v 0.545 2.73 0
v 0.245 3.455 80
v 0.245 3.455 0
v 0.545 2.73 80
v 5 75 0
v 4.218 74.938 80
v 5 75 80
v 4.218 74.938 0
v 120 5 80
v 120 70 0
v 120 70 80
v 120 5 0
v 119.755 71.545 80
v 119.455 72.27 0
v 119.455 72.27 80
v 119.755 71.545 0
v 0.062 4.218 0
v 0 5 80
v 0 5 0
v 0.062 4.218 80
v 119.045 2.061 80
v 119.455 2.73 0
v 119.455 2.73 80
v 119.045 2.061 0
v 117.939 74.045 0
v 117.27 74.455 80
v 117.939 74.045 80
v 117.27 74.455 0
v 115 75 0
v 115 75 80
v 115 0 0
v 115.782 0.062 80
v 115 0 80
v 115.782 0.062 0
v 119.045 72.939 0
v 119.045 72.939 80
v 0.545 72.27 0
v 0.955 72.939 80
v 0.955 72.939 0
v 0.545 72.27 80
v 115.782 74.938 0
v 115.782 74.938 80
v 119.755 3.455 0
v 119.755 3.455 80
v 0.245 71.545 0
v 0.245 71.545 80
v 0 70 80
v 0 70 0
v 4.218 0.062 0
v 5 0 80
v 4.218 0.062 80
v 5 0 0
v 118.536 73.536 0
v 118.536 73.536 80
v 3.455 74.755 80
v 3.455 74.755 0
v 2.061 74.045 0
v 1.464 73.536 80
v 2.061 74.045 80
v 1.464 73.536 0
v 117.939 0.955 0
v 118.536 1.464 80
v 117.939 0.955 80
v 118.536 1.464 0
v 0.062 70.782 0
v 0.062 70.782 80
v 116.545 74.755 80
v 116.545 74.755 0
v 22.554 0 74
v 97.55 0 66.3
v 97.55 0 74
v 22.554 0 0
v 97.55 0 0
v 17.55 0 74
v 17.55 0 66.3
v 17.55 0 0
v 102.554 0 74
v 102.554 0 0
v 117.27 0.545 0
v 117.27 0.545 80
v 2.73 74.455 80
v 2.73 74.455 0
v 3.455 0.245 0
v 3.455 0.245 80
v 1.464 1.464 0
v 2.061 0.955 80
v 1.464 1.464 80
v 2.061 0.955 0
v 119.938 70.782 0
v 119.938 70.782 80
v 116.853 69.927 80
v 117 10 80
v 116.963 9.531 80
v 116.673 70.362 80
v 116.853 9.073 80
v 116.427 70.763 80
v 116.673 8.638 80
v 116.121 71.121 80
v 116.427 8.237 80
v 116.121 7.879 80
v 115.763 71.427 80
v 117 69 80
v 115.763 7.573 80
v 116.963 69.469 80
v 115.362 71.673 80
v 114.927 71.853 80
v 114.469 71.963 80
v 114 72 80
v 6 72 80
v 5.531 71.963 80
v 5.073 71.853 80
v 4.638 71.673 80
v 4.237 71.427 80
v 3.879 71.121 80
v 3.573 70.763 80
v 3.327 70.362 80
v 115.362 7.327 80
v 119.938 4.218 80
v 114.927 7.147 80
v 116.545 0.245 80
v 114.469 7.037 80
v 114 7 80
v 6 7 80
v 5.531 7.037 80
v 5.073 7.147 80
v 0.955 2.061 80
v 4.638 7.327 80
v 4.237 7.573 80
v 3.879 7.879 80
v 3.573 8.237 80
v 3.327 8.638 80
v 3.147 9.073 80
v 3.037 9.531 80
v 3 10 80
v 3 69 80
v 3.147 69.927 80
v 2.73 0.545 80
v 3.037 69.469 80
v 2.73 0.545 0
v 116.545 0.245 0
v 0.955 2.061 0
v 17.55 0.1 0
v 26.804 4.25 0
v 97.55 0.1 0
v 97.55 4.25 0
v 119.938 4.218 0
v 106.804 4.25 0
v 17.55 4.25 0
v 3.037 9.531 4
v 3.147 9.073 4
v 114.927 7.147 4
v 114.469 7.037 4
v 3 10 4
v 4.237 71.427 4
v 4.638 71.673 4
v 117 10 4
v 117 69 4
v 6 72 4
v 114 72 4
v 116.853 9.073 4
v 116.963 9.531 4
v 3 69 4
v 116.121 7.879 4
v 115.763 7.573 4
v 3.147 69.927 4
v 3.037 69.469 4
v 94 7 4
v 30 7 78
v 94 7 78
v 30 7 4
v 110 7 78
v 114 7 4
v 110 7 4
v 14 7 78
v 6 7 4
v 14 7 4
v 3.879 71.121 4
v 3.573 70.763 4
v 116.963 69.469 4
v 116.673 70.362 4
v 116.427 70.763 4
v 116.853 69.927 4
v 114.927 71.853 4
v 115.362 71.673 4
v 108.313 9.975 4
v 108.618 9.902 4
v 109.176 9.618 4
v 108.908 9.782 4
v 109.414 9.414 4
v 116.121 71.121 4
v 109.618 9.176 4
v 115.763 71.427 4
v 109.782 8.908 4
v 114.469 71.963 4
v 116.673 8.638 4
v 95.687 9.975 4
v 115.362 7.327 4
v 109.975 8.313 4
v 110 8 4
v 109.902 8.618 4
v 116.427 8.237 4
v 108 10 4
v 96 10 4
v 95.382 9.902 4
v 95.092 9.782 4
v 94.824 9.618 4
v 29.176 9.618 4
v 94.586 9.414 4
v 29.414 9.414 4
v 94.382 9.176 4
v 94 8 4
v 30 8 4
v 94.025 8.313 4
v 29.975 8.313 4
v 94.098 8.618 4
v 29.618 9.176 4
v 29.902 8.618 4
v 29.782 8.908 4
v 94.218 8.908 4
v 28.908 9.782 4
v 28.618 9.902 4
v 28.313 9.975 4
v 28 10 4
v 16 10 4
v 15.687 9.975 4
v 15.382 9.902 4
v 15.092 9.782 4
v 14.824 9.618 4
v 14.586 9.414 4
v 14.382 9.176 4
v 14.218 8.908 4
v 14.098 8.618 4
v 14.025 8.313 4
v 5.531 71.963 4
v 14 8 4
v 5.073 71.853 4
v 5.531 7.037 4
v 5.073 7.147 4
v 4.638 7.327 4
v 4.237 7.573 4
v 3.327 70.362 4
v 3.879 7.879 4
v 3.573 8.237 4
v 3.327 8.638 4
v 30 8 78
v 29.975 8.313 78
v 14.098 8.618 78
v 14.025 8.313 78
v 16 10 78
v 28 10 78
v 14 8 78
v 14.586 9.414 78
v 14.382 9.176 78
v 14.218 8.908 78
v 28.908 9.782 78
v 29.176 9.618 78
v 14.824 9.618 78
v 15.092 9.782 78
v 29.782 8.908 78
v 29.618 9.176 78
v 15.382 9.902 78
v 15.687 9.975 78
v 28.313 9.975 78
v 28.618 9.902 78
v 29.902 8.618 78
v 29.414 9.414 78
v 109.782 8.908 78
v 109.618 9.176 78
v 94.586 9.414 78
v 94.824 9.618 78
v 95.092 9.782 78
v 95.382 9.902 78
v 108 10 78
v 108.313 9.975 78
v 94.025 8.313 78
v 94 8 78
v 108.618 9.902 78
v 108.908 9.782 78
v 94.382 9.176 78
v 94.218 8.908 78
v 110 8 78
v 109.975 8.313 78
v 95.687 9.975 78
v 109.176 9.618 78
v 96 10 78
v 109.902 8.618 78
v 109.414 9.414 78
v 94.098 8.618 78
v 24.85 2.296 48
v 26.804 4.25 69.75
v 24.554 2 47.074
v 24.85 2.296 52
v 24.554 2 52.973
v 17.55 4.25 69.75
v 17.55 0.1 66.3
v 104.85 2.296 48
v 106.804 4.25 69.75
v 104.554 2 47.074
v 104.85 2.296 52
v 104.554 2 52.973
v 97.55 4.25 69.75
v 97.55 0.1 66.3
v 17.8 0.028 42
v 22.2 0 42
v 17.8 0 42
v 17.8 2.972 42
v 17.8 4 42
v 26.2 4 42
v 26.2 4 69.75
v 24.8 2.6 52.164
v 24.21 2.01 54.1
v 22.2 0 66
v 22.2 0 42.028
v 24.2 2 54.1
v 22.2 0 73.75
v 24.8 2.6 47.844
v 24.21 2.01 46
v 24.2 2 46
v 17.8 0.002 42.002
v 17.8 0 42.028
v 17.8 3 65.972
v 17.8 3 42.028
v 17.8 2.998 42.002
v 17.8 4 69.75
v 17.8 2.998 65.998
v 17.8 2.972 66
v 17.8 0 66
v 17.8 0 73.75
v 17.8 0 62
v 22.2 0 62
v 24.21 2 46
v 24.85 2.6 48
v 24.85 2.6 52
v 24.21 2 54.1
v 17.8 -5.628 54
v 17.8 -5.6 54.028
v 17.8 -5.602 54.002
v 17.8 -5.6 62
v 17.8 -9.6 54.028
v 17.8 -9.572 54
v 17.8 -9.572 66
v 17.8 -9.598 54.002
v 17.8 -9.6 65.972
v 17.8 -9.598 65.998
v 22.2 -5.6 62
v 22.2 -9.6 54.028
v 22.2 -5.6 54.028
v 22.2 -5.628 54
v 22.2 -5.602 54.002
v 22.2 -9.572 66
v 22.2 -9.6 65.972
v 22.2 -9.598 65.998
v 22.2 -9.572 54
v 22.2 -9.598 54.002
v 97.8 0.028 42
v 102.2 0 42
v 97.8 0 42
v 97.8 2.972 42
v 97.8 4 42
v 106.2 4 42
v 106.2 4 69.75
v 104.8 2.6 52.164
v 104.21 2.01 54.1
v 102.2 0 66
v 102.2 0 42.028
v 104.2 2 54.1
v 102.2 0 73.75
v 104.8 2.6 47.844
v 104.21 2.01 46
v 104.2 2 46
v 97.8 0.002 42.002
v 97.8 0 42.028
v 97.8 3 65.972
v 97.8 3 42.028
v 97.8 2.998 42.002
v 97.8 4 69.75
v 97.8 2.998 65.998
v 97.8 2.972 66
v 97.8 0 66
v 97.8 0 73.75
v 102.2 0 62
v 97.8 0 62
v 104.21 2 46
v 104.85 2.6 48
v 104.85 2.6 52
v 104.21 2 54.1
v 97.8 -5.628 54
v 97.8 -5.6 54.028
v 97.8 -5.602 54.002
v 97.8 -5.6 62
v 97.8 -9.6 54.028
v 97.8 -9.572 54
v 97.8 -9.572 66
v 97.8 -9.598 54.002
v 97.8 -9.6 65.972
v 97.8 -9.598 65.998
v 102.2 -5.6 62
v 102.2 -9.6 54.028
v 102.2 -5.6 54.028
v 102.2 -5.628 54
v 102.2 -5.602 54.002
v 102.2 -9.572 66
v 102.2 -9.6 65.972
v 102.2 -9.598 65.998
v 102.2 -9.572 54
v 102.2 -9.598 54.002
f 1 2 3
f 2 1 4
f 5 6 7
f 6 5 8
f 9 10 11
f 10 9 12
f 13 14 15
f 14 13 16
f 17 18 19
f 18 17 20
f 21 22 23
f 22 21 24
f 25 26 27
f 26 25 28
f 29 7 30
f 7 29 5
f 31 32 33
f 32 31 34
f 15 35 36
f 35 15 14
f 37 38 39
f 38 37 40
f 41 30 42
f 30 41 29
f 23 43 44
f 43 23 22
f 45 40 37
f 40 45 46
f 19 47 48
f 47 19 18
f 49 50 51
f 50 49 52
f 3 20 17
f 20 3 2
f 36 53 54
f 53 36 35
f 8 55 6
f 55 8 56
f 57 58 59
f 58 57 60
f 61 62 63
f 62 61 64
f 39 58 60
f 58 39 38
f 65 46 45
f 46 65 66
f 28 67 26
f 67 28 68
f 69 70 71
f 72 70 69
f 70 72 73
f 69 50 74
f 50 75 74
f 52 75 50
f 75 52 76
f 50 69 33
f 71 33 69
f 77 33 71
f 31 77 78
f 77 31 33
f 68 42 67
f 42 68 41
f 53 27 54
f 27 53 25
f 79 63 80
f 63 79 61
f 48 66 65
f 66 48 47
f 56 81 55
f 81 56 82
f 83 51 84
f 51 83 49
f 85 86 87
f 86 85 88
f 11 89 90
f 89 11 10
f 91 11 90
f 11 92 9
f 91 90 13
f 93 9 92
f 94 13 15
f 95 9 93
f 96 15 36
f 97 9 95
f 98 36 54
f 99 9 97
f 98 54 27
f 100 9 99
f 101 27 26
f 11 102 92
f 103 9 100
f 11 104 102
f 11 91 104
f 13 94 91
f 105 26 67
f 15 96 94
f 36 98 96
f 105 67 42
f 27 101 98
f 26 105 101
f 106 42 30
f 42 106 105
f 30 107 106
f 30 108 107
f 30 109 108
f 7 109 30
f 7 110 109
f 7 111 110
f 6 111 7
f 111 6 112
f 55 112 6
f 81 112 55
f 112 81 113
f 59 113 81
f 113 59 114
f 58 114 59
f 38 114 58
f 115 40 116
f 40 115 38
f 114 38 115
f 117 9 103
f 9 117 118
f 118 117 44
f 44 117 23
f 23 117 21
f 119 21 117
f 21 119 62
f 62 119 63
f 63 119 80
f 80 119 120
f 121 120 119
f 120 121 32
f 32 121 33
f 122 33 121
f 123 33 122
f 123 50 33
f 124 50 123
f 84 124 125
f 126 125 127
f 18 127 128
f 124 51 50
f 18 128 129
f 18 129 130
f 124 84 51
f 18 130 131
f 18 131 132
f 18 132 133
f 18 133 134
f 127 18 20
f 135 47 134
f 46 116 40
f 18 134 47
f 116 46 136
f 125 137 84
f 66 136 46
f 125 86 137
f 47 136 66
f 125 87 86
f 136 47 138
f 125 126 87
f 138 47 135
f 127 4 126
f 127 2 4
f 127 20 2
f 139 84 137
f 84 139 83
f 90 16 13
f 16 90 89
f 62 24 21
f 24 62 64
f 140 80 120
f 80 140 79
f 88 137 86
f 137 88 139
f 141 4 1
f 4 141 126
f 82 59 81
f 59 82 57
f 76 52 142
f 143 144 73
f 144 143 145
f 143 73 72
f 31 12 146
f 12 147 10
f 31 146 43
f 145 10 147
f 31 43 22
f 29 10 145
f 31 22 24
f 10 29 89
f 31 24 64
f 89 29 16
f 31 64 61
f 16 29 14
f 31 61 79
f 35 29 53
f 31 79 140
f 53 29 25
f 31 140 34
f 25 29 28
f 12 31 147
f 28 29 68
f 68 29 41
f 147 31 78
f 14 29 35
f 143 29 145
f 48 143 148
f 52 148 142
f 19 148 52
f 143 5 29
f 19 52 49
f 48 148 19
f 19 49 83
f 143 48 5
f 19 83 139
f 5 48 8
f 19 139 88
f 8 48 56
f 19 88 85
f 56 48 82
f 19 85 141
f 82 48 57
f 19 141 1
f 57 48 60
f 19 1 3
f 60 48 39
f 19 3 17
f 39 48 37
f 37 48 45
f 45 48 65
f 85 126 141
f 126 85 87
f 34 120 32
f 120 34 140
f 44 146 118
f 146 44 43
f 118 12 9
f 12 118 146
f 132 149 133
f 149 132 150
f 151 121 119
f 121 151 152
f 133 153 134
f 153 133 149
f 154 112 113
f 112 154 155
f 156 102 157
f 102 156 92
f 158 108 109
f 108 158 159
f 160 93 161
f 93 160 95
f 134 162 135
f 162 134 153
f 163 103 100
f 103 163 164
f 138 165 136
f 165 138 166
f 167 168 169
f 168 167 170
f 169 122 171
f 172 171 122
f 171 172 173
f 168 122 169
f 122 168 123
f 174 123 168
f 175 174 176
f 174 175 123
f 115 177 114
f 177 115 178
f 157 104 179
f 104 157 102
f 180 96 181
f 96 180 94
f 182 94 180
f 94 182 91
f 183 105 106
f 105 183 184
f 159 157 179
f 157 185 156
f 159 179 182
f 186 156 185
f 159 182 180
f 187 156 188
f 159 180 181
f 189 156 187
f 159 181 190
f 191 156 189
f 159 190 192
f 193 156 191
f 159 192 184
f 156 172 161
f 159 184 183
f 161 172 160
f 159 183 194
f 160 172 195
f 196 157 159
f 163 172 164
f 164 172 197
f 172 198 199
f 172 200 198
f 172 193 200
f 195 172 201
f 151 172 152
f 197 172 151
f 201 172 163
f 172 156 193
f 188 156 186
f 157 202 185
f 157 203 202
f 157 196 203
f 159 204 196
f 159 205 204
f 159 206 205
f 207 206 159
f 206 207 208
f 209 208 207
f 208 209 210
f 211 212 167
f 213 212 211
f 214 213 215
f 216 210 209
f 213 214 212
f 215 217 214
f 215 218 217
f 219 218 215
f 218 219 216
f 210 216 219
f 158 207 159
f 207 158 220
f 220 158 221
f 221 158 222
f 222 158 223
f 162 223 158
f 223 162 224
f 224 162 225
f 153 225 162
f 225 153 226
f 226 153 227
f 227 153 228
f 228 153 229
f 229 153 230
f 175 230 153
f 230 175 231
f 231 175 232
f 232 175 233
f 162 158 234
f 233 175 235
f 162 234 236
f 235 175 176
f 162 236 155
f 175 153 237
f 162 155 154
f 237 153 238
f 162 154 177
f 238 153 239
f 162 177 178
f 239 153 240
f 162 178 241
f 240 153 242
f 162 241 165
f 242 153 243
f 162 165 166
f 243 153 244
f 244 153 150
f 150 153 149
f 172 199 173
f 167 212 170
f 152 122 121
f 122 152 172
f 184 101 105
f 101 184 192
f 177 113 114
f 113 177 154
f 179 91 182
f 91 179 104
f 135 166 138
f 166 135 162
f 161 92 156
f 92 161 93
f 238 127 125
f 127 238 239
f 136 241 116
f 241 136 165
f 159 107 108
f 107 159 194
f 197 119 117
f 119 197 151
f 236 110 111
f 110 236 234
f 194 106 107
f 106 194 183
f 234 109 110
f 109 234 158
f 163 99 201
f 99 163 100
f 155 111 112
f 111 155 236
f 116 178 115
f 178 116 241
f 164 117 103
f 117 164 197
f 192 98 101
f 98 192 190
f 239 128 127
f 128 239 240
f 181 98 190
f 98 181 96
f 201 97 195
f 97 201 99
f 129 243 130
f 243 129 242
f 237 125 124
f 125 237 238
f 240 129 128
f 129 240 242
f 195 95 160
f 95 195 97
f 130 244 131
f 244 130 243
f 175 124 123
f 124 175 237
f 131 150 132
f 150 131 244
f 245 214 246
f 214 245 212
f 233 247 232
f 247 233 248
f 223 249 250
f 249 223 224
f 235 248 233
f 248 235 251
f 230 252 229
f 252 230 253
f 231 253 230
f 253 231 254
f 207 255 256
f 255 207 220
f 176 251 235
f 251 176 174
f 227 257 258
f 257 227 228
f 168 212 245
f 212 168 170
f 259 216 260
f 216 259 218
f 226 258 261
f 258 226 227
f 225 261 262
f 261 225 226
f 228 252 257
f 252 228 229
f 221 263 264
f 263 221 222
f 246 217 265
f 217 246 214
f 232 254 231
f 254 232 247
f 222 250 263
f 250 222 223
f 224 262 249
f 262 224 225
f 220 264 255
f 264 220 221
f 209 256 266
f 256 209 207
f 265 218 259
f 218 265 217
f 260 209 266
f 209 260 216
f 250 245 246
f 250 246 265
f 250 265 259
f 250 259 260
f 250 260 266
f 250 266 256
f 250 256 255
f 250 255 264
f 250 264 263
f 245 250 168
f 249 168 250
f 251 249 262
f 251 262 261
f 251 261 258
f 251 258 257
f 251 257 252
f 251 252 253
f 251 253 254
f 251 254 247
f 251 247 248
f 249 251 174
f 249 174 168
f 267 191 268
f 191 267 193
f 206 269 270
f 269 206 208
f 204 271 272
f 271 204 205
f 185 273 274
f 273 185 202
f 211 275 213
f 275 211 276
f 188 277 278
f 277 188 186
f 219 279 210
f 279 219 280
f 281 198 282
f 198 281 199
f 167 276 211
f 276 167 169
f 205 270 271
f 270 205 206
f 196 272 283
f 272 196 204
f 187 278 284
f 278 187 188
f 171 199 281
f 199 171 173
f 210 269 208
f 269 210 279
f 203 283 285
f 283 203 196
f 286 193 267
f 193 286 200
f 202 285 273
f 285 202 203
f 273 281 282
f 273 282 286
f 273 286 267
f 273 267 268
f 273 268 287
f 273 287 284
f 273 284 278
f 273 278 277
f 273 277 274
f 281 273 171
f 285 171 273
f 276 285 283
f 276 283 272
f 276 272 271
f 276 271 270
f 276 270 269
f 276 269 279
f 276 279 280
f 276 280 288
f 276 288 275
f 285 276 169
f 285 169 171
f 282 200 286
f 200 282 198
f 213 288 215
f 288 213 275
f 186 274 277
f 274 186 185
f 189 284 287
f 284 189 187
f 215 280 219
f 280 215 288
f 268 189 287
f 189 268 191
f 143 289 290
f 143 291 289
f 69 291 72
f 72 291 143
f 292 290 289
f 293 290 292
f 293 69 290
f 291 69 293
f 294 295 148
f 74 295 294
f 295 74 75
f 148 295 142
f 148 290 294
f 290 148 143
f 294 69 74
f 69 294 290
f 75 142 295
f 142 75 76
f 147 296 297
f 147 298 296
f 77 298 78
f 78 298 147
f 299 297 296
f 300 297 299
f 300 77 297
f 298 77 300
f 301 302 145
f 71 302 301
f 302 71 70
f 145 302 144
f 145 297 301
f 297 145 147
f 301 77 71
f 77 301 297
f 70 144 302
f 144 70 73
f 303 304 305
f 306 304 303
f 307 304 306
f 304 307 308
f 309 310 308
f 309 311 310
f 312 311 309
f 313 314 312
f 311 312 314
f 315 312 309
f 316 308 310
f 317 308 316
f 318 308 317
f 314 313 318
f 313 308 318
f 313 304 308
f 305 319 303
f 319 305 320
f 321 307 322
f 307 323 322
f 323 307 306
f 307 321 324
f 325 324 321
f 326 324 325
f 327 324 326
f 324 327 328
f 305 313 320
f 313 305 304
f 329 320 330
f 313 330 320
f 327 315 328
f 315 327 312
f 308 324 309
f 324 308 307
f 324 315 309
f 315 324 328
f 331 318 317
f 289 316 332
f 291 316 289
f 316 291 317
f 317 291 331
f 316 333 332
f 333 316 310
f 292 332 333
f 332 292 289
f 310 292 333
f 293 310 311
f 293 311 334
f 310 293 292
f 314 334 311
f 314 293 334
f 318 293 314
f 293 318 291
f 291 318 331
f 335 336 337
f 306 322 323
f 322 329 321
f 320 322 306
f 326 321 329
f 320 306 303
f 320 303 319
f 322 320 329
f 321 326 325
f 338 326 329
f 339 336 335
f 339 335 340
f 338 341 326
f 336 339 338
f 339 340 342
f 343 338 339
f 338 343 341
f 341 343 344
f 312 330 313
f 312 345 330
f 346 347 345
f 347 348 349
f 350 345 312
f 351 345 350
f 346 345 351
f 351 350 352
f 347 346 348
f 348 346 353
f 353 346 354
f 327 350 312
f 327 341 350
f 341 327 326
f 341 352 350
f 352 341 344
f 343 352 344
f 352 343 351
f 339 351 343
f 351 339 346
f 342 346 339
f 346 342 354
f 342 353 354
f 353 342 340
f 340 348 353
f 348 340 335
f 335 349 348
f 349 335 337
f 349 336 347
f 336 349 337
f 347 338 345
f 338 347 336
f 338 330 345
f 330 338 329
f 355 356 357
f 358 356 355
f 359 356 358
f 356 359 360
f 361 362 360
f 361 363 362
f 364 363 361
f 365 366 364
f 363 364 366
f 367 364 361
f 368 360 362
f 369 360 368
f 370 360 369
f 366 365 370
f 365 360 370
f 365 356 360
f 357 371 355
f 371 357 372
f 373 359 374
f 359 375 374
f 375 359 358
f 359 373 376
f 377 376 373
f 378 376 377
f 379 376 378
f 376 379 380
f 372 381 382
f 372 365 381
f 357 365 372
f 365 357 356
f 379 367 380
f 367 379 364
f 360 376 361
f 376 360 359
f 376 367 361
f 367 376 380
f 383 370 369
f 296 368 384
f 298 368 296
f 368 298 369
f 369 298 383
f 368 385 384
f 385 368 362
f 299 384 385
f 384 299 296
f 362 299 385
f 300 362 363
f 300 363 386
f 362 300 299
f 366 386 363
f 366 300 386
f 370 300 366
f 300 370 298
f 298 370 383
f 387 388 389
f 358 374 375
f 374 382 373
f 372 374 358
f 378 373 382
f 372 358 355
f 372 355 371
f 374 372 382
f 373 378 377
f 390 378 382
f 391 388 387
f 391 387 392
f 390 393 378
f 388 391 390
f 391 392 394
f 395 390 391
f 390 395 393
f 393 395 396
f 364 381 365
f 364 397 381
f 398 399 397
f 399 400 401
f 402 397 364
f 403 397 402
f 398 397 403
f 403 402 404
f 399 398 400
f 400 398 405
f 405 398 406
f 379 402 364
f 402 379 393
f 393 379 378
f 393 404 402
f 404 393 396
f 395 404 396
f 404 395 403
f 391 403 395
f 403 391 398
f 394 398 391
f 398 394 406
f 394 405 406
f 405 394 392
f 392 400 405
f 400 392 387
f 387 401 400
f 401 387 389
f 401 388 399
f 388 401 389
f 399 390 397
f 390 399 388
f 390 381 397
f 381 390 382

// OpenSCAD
// SKADIS: bottom-insert, asymmetric dovetail; sloped closed top bears load.
// part 0 assembly, 1 box upright, 2 hook on its flat side. Millimetres.
/* [Output] */
part = 0; // [0:Assembly,1:Box,2:Hook for printing]
/* [Box dimensions in mm] */
width = 120; // [60:1:300]
depth = 75; // [30:1:200]
height = 80; // [50:1:250]
wall = 3; // [2:0.2:6]
floor_thickness = 4; // [2:0.2:8]
back_thickness = 7; // [7:0.5:12]
corner_radius = 5; // [3:0.5:12]
/* [Mount placement] */
hook_count = 2; // [2:1:5]
// Distance between adjacent hooks = this value times the 40 mm board grid.
hook_spacing_steps = 2; // [1:1:6]
// Distance from box rim to hook neck top.
mount_top_offset = 14; // [14:1:30]
/* [Fit] */
fit = 0.25; // [0.15:0.05:0.4]
// Small friction ridge, not a positive latch.
friction_ridge_enabled = true;
/* [Hidden] */
hook_width=4.4;
board_pitch=40;
hook_spacing=board_pitch*hook_spacing_steps;
hook_span=(hook_count-1)*hook_spacing;
mount_shift=height-mount_top_offset-66;
rib_height=height-mount_top_offset+12;
$fn=40;
assert(width >= hook_span+32, "Box too narrow: reduce hook spacing/count or increase width.");
assert(height >= mount_top_offset+36, "Box too short for hook and upper stop.");
assert(wall >= 2 && floor_thickness >= 2 && back_thickness >= 7, "Walls/floor below minimum.");
assert(depth >= back_thickness+wall+12, "Box too shallow.");
assert(corner_radius >= wall && 2*corner_radius < min(width,depth), "Invalid corner radius.");
assert(fit >= 0.15 && fit <= 0.4, "Fit must be between 0.15 and 0.4 mm.");
assert(hook_count >= 2 && hook_count == floor(hook_count), "Use at least two hooks.");
assert(hook_spacing_steps >= 1 && hook_spacing_steps == floor(hook_spacing_steps), "Spacing must follow board grid.");
module rr(w,d,r) { hull() for(x=[r,w-r]) for(y=[r,d-r]) translate([x,y]) circle(r=r); }
// Cross section has a flat left side, permitting hook printing on that side.
module male_section() { polygon([[-2.2,0],[2.2,0],[6.2,4],[-2.2,4]]); }
module female_section() { offset(delta=fit) male_section(); }
// Wedge under z=74-y. Roof closes from inner wall outward at 45 degrees.
module under_roof() {
 translate([-20,0,0]) rotate([90,0,90]) linear_extrude(40)
  polygon([[-3,-2],[8,-2],[8,66+mount_shift],[-3,77+mount_shift]]);
}
module channel() {
 intersection() {
  translate([0,0,-1]) linear_extrude(height+1) female_section();
  under_roof();
 }
 // Open throat for the neck, also open at bottom of the rail.
 translate([-2.2-fit,-3,-1]) cube([4.4+2*fit,3.1,67.3+mount_shift]);
}
module body() {
 difference() {
  union() {
   difference() {
    linear_extrude(height) rr(width,depth,corner_radius);
    translate([wall,back_thickness,floor_thickness]) linear_extrude(height) rr(width-2*wall,depth-back_thickness-wall,max(1,corner_radius-wall+1));
   }
   // Internal ribs start at floor: no floating socket undersides.
   for(i=[0:hook_count-1]) translate([((width-hook_span)/2+i*hook_spacing)-6,0,0]) linear_extrude(rib_height) rr(16,10,2);
  }
  for(i=[0:hook_count-1]) translate([((width-hook_span)/2+i*hook_spacing),0,0]) channel();
 }
}
module blade_profile() {
 offset(delta=-0.7) offset(r=0.7) union() {
  translate([-9.6,62]) square([12.6,4]);
  translate([-9.6,54]) square([4,12]);
  translate([0,42]) square([3,24]);
 }
}
module friction_ridge() {
 hull() {
 translate([4.2,2,46]) cube([0.01,0.6,0.1]);
 translate([4.2,2,48]) cube([0.65,0.6,4]);
 translate([4.2,2,54]) cube([0.01,0.6,0.1]);
 }
}
module hook() {
 union() {
  if(friction_ridge_enabled) translate([0,0,mount_shift]) friction_ridge();
  intersection() {
   translate([0,0,42+mount_shift]) linear_extrude(36) male_section();
   translate([0,0,-fit]) under_roof();
  }
  translate([-2.2,0,mount_shift]) multmatrix([[0,0,1,0],[1,0,0,0],[0,1,0,0],[0,0,0,1]])
   linear_extrude(hook_width) blade_profile();
 }
}
if(part==1) body();
else if(part==2) translate([10,0,2.2]) rotate([0,-90,0]) translate([0,0,-42-mount_shift]) hook();
else {
 color([0.18,0.55,0.64]) body();
 for(i=[0:hook_count-1]) color([0.95,0.65,0.22]) translate([((width-hook_span)/2+i*hook_spacing),0,0]) hook();
}
